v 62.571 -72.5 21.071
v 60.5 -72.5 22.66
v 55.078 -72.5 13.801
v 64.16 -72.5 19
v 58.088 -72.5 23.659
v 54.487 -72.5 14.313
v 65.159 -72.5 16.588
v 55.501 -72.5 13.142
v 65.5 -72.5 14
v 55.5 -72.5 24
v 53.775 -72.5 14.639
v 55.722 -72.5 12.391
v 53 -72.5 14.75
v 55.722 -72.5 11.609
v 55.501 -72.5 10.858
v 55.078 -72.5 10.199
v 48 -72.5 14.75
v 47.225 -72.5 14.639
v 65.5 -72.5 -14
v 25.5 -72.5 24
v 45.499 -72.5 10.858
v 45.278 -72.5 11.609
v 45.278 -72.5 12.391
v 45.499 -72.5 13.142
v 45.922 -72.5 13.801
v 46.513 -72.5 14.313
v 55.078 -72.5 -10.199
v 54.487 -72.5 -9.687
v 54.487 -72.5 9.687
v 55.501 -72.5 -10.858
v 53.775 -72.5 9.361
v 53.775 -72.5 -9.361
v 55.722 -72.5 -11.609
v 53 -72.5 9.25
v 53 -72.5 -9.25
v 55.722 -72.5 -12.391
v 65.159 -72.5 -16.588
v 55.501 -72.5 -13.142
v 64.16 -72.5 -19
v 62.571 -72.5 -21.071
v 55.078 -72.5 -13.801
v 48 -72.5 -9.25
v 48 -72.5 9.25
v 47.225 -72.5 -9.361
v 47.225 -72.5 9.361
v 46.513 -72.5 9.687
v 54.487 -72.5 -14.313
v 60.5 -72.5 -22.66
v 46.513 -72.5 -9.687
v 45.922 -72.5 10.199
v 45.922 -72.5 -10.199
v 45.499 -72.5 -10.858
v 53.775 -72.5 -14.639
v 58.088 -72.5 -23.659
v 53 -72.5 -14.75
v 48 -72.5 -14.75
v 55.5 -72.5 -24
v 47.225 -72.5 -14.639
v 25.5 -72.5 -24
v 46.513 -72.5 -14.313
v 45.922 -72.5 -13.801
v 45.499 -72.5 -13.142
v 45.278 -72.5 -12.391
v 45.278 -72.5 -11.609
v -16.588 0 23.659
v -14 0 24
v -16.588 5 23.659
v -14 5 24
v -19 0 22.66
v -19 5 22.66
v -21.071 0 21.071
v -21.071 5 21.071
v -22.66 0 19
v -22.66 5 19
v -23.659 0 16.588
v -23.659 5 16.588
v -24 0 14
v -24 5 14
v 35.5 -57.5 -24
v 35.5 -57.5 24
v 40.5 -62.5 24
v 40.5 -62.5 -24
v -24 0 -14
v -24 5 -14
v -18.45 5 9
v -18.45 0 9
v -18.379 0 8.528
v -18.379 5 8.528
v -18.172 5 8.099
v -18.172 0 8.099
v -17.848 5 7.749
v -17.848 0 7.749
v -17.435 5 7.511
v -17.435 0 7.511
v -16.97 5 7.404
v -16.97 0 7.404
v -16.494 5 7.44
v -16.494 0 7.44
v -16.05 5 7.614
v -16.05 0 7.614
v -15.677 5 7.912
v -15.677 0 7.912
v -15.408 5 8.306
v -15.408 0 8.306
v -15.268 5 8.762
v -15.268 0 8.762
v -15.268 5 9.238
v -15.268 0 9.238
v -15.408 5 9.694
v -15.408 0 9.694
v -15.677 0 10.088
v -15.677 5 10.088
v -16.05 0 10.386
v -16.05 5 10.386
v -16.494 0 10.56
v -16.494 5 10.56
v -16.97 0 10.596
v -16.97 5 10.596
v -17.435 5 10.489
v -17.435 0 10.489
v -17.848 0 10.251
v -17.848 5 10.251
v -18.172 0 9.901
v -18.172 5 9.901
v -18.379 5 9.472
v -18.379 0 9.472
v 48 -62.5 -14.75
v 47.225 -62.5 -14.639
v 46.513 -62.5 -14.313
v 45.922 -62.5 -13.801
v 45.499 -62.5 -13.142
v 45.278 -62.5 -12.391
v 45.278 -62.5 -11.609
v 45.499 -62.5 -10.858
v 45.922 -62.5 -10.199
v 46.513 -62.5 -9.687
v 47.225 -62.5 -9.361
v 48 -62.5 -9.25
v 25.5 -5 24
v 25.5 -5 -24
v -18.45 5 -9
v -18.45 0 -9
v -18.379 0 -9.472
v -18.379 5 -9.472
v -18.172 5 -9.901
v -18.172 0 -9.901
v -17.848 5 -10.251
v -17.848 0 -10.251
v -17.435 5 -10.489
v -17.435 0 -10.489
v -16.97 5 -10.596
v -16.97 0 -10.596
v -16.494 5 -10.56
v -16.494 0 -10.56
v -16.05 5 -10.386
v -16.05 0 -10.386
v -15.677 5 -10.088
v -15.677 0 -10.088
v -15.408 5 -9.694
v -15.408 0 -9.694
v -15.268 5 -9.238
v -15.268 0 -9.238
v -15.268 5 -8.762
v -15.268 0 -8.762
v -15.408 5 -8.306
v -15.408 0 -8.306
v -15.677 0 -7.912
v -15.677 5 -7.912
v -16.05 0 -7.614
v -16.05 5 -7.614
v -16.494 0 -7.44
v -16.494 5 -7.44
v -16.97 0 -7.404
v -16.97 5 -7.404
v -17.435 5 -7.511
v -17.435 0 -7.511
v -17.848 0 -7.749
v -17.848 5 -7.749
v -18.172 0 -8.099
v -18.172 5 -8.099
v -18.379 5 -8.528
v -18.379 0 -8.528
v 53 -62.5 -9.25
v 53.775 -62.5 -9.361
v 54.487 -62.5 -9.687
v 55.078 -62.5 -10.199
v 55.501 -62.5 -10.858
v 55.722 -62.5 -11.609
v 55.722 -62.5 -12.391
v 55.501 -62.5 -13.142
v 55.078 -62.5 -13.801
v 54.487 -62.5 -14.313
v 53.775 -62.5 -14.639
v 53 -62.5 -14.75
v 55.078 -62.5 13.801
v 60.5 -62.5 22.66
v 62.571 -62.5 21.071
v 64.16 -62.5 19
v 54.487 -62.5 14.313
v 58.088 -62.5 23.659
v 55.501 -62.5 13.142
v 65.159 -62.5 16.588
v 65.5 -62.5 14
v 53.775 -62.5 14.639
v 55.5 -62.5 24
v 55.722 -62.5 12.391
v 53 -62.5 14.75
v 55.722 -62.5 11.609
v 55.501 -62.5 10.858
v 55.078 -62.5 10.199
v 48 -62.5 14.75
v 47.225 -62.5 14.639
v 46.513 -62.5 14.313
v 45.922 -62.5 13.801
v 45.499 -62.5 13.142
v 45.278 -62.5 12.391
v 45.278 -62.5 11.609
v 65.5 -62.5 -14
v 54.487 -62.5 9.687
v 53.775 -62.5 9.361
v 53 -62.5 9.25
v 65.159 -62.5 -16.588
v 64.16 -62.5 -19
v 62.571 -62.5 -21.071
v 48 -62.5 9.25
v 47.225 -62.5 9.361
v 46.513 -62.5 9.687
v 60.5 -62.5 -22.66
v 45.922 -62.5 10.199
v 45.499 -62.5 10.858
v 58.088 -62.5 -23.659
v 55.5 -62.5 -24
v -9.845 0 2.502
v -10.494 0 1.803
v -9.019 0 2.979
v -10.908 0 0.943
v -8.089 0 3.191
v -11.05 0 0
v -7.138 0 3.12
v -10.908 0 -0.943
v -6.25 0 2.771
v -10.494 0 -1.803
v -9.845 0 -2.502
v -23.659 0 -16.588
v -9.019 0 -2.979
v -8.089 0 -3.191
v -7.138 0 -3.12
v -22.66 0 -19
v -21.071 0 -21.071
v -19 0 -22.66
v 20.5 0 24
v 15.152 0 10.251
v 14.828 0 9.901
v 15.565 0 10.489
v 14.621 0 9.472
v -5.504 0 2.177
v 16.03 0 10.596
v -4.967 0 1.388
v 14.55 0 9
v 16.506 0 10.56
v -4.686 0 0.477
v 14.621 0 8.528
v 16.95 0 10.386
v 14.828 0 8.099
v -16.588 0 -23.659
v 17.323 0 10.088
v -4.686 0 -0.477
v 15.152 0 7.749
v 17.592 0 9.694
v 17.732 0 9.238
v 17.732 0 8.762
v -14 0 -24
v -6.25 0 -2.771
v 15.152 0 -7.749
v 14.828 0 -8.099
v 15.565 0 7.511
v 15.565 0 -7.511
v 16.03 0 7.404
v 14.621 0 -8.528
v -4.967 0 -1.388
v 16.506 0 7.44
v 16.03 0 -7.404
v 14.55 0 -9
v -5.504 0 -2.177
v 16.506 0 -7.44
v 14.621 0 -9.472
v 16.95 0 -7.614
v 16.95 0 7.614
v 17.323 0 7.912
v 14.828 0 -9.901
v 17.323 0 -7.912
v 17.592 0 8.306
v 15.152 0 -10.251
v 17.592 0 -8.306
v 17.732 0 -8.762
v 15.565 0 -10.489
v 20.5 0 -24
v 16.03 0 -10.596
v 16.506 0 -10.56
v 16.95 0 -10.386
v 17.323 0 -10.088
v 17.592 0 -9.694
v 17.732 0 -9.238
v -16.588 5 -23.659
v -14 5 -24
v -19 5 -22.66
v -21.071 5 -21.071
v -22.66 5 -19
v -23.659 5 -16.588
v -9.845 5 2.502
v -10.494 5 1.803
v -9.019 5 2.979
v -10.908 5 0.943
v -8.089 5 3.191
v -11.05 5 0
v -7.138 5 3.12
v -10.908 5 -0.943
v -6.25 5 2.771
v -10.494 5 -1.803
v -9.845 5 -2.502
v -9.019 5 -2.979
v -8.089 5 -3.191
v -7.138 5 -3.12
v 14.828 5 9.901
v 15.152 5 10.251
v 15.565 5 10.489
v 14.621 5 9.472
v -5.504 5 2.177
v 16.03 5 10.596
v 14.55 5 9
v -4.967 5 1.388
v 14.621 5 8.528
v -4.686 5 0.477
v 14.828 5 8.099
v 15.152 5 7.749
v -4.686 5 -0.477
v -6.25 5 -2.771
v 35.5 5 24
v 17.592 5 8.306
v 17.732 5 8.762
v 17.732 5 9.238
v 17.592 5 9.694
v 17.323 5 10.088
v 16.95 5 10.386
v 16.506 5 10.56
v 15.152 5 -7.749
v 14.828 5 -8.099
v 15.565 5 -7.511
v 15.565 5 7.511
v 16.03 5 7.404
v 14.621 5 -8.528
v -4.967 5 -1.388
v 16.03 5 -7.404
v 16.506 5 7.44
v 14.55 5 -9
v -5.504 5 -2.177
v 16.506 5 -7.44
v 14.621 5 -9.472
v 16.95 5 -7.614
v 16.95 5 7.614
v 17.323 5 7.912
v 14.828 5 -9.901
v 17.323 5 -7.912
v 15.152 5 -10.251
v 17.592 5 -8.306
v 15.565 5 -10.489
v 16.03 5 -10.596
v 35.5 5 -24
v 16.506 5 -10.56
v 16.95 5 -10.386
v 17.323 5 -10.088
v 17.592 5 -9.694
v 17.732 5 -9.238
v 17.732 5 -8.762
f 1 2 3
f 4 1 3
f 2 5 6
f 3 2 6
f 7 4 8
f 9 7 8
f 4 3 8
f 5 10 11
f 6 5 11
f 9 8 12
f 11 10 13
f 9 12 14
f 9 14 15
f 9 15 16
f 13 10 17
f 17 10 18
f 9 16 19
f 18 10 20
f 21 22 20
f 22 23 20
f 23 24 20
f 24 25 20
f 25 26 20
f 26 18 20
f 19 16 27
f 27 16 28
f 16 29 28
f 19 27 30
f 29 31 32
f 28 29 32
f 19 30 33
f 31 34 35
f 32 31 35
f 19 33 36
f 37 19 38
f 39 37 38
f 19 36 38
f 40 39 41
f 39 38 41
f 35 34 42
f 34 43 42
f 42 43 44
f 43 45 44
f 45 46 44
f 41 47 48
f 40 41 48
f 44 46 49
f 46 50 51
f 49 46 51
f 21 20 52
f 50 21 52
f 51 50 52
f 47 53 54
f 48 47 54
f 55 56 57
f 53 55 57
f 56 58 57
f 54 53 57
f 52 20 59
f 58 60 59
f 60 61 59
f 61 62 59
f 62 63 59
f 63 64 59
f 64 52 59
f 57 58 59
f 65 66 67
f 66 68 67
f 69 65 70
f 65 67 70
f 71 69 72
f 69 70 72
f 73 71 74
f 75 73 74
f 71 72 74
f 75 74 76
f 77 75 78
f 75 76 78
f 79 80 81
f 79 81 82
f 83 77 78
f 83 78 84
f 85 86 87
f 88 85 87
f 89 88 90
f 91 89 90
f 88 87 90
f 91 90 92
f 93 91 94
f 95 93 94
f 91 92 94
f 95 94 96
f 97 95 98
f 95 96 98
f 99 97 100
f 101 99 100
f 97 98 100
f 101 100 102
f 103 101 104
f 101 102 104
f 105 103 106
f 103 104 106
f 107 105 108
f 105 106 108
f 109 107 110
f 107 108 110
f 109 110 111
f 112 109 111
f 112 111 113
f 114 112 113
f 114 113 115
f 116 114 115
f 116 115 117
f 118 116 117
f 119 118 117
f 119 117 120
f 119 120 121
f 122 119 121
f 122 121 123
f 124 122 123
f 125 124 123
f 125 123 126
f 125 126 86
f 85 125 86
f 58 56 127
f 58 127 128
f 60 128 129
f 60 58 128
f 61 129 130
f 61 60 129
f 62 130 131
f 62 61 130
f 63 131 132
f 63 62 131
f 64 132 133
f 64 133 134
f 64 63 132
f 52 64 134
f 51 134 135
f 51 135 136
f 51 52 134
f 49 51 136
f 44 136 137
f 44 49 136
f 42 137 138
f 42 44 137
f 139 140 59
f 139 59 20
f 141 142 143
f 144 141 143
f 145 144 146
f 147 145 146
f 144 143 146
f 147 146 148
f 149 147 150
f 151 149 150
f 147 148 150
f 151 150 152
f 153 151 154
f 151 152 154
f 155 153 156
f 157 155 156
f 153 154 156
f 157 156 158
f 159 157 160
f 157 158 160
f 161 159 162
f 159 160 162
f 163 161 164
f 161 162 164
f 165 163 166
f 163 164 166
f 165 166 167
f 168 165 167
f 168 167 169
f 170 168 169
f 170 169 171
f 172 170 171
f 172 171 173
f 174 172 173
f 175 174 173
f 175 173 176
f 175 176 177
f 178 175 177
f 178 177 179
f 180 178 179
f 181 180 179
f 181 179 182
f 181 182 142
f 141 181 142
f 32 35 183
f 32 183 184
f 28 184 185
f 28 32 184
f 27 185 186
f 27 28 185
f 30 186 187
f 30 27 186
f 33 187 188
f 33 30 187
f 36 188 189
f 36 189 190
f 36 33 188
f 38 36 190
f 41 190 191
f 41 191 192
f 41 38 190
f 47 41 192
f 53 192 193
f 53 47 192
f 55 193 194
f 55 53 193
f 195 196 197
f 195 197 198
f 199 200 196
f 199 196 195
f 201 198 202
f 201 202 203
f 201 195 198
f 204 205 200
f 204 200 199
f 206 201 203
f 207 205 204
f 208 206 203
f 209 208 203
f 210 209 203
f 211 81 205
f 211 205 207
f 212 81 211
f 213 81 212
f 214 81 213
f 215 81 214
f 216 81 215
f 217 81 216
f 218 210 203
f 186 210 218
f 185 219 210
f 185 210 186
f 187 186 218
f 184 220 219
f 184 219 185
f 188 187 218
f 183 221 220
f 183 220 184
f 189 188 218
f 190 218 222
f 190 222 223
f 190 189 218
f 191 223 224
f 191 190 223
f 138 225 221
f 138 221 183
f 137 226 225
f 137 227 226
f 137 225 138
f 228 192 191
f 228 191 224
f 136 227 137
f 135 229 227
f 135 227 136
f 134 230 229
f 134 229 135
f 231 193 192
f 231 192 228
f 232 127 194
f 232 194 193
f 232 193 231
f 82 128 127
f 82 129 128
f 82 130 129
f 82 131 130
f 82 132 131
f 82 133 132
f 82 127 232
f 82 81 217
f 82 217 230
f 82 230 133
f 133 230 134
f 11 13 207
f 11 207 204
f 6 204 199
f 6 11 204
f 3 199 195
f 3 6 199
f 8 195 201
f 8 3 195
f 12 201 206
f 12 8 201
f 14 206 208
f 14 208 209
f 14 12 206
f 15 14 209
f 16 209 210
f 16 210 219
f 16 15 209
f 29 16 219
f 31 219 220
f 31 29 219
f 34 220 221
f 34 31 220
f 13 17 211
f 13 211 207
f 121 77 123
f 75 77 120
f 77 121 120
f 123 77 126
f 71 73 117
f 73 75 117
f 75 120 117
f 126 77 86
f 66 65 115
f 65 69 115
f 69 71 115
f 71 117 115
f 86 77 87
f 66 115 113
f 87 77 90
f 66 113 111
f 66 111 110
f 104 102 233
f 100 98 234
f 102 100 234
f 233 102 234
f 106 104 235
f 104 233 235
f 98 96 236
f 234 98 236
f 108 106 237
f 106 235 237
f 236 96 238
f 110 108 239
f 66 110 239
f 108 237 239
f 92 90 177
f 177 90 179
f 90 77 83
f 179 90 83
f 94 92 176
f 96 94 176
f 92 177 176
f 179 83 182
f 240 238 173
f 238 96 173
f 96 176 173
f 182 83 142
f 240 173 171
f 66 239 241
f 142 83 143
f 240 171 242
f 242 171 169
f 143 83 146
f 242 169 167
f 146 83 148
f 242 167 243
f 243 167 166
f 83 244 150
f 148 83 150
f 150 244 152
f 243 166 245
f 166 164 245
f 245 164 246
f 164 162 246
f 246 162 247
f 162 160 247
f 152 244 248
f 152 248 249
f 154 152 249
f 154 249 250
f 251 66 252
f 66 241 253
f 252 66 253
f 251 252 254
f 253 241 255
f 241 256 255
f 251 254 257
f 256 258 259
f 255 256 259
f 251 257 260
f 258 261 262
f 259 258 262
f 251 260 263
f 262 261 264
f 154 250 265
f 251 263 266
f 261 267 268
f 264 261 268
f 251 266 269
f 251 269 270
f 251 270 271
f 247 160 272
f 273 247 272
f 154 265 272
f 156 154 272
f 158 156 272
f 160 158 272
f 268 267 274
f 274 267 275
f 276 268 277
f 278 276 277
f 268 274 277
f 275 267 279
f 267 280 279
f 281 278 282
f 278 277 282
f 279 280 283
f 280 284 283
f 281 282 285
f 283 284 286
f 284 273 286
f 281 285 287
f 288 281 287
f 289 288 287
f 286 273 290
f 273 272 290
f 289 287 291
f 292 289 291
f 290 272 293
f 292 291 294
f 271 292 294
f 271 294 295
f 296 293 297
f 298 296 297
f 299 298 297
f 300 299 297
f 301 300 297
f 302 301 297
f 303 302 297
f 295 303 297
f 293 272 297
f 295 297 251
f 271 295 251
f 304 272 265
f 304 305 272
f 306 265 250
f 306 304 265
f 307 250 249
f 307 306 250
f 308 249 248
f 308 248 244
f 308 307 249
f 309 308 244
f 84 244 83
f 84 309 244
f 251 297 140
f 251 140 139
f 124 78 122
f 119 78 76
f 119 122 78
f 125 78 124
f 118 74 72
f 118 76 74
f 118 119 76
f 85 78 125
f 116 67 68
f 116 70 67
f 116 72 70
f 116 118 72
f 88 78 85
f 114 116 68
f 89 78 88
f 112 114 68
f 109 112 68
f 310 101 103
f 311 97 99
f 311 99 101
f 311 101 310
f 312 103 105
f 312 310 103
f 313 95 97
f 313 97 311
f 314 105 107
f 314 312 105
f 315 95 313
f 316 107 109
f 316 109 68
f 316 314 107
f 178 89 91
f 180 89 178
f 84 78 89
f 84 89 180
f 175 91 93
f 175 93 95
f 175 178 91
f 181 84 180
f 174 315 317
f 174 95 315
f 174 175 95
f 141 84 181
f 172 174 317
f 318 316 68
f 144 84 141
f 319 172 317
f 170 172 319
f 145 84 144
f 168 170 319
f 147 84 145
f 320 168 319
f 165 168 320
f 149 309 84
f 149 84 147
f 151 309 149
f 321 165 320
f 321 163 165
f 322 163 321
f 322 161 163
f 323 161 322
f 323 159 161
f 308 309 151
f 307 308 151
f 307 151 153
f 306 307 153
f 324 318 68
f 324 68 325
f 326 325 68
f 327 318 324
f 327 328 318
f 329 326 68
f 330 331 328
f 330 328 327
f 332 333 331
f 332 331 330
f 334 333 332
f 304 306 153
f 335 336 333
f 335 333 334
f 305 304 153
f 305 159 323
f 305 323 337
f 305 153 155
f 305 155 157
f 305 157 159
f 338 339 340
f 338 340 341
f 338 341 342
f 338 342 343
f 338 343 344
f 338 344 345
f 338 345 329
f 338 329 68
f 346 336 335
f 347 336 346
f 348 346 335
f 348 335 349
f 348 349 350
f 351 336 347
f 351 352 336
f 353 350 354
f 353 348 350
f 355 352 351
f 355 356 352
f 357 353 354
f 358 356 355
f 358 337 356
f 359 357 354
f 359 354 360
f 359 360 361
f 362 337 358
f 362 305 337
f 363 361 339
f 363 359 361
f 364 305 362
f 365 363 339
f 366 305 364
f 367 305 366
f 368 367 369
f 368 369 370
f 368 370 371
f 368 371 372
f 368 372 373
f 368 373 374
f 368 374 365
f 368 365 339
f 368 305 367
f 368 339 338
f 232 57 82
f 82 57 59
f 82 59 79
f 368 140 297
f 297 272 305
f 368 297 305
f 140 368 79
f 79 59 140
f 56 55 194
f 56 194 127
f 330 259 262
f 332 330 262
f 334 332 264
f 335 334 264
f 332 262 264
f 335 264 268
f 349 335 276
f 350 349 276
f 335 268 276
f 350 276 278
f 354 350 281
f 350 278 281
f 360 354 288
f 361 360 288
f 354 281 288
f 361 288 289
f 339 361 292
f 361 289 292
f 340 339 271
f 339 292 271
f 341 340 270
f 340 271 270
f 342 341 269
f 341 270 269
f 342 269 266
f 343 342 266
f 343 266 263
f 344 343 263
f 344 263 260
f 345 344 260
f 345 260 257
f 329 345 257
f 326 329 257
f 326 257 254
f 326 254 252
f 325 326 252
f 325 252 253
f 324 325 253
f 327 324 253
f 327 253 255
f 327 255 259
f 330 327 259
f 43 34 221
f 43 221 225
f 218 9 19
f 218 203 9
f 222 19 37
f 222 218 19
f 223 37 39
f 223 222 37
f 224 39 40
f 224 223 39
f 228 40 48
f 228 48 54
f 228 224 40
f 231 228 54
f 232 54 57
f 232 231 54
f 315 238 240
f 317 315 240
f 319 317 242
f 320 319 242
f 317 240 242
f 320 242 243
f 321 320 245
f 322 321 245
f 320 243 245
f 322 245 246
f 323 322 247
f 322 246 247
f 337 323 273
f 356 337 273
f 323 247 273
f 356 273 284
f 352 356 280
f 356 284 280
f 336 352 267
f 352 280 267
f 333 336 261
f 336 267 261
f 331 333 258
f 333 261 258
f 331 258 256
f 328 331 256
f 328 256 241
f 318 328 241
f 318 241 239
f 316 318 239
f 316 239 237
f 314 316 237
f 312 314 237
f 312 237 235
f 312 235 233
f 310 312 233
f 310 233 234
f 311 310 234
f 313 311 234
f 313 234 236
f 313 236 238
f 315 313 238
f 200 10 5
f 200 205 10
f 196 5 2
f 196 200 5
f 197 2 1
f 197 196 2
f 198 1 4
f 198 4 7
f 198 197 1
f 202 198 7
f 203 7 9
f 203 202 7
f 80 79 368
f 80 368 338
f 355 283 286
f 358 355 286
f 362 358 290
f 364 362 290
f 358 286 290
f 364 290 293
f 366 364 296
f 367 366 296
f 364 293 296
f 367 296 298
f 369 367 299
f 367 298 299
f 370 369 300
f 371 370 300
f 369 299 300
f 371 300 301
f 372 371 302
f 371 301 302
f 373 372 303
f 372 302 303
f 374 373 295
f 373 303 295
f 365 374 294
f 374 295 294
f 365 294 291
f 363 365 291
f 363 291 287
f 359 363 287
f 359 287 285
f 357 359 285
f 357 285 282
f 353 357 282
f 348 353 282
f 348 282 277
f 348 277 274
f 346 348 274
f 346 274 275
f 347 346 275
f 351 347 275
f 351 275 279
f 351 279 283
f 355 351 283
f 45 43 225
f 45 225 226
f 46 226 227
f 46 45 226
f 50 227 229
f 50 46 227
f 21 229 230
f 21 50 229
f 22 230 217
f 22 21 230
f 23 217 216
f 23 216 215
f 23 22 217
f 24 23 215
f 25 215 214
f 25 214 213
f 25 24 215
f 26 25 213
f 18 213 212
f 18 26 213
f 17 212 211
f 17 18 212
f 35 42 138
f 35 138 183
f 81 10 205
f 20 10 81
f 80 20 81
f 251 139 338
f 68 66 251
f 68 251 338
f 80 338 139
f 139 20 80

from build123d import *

# Parameters (mm, degrees)
SKETCH1_W                 = 59.5
SKETCH1_H                 = 48
BOSS_EXTRUDE1_DEPTH       = 5
SKETCH2_W                 = 10
SKETCH2_H                 = 48
BOSS_EXTRUDE2_DEPTH       = 72.5
SKETCH3_W                 = 48
SKETCH3_H                 = 10
BOSS_EXTRUDE3_DEPTH       = 30
FILLET1_R                 = 10
F_1_0MM_START             = -72.5
F_1_0MM_DOWEL_SLOT1_DEPTH = 10
FILLET2_R                 = 10
M3_CLEARANCE_HOLE1_D      = 3.2
M6_CLEARANCE_HOLE1_D      = 6.4
CHAMFER1_SIZE             = 5


# Read off the part's stored shape, not the designer's step: Ø1.0mm Dowel Slot1
with BuildPart() as part:
    # Sketch1 → Boss-Extrude1 (new body)
    with BuildSketch(Plane(origin=(0, 0, 0), x_dir=(1, 0, 0), z_dir=(0, 1, 0))):
        with Locations((5.75, 0)):
            Rectangle(SKETCH1_W, SKETCH1_H)
    extrude(amount=BOSS_EXTRUDE1_DEPTH)

    # Sketch2 → Boss-Extrude2 (add)
    with BuildSketch(Plane.XZ):
        with Locations((30.5, 0)):
            Rectangle(SKETCH2_W, SKETCH2_H)
    extrude(amount=BOSS_EXTRUDE2_DEPTH)

    # Sketch3 → Boss-Extrude3 (add)
    with BuildSketch(Plane(origin=(35.5, 0, 0), x_dir=(0, 0, -1), z_dir=(1, 0, 0))):
        with Locations((0, -67.5)):
            Rectangle(SKETCH3_W, SKETCH3_H)
    extrude(amount=BOSS_EXTRUDE3_DEPTH)

    # Fillet1
    fillet1_edges = [part.edges().sort_by_distance(p)[0] for p in [
        (-24, 2.5, -24),
        (-24, 2.5, 24),
    ]]
    fillet(fillet1_edges, radius=FILLET1_R)

    # Ø1.0mm Dowel Slot1 outline → Ø1.0mm Dowel Slot1 (cut)
    with BuildSketch(Plane(origin=(0, 0, 0), x_dir=(1, 0, 0), z_dir=(0, 1, 0)).offset(F_1_0MM_START)):
        with BuildLine():
            Line((53, 14.75), (48, 14.75))
            ThreePointArc((48, 14.75), (45.25, 12), (48, 9.25))
            Line((48, 9.25), (53, 9.25))
            ThreePointArc((53, 9.25), (55.75, 12), (53, 14.75))
        make_face()
        with BuildLine():
            Line((53, -9.25), (48, -9.25))
            ThreePointArc((48, -9.25), (45.25, -12), (48, -14.75))
            Line((48, -14.75), (53, -14.75))
            ThreePointArc((53, -14.75), (55.75, -12), (53, -9.25))
        make_face()
    extrude(amount=F_1_0MM_DOWEL_SLOT1_DEPTH, mode=Mode.SUBTRACT)

    # Fillet2
    fillet2_edges = [part.edges().sort_by_distance(p)[0] for p in [
        (65.5, -67.5, 24),
        (65.5, -67.5, -24),
    ]]
    fillet(fillet2_edges, radius=FILLET2_R)

    # M3 Clearance Hole1 (through all)
    with Locations(Plane(origin=(0, 5, 0), x_dir=(1, 0, 0), z_dir=(0, 1, 0))):
        with Locations((-16.85, -9), (-16.85, 9), (16.15, 9), (16.15, -9)):
            Hole(M3_CLEARANCE_HOLE1_D / 2)

    # M6 Clearance Hole1 (through all)
    with Locations(Plane(origin=(0, 5, 0), x_dir=(1, 0, 0), z_dir=(0, 1, 0))):
        with Locations((-7.85, 0)):
            Hole(M6_CLEARANCE_HOLE1_D / 2)

    # Chamfer1
    chamfer1_edges = [part.edges().sort_by_distance(p)[0] for p in [
        (25.5, 0, 0),
        (35.5, -62.5, 0),
    ]]
    chamfer(chamfer1_edges, length=CHAMFER1_SIZE)


solid = part.part
